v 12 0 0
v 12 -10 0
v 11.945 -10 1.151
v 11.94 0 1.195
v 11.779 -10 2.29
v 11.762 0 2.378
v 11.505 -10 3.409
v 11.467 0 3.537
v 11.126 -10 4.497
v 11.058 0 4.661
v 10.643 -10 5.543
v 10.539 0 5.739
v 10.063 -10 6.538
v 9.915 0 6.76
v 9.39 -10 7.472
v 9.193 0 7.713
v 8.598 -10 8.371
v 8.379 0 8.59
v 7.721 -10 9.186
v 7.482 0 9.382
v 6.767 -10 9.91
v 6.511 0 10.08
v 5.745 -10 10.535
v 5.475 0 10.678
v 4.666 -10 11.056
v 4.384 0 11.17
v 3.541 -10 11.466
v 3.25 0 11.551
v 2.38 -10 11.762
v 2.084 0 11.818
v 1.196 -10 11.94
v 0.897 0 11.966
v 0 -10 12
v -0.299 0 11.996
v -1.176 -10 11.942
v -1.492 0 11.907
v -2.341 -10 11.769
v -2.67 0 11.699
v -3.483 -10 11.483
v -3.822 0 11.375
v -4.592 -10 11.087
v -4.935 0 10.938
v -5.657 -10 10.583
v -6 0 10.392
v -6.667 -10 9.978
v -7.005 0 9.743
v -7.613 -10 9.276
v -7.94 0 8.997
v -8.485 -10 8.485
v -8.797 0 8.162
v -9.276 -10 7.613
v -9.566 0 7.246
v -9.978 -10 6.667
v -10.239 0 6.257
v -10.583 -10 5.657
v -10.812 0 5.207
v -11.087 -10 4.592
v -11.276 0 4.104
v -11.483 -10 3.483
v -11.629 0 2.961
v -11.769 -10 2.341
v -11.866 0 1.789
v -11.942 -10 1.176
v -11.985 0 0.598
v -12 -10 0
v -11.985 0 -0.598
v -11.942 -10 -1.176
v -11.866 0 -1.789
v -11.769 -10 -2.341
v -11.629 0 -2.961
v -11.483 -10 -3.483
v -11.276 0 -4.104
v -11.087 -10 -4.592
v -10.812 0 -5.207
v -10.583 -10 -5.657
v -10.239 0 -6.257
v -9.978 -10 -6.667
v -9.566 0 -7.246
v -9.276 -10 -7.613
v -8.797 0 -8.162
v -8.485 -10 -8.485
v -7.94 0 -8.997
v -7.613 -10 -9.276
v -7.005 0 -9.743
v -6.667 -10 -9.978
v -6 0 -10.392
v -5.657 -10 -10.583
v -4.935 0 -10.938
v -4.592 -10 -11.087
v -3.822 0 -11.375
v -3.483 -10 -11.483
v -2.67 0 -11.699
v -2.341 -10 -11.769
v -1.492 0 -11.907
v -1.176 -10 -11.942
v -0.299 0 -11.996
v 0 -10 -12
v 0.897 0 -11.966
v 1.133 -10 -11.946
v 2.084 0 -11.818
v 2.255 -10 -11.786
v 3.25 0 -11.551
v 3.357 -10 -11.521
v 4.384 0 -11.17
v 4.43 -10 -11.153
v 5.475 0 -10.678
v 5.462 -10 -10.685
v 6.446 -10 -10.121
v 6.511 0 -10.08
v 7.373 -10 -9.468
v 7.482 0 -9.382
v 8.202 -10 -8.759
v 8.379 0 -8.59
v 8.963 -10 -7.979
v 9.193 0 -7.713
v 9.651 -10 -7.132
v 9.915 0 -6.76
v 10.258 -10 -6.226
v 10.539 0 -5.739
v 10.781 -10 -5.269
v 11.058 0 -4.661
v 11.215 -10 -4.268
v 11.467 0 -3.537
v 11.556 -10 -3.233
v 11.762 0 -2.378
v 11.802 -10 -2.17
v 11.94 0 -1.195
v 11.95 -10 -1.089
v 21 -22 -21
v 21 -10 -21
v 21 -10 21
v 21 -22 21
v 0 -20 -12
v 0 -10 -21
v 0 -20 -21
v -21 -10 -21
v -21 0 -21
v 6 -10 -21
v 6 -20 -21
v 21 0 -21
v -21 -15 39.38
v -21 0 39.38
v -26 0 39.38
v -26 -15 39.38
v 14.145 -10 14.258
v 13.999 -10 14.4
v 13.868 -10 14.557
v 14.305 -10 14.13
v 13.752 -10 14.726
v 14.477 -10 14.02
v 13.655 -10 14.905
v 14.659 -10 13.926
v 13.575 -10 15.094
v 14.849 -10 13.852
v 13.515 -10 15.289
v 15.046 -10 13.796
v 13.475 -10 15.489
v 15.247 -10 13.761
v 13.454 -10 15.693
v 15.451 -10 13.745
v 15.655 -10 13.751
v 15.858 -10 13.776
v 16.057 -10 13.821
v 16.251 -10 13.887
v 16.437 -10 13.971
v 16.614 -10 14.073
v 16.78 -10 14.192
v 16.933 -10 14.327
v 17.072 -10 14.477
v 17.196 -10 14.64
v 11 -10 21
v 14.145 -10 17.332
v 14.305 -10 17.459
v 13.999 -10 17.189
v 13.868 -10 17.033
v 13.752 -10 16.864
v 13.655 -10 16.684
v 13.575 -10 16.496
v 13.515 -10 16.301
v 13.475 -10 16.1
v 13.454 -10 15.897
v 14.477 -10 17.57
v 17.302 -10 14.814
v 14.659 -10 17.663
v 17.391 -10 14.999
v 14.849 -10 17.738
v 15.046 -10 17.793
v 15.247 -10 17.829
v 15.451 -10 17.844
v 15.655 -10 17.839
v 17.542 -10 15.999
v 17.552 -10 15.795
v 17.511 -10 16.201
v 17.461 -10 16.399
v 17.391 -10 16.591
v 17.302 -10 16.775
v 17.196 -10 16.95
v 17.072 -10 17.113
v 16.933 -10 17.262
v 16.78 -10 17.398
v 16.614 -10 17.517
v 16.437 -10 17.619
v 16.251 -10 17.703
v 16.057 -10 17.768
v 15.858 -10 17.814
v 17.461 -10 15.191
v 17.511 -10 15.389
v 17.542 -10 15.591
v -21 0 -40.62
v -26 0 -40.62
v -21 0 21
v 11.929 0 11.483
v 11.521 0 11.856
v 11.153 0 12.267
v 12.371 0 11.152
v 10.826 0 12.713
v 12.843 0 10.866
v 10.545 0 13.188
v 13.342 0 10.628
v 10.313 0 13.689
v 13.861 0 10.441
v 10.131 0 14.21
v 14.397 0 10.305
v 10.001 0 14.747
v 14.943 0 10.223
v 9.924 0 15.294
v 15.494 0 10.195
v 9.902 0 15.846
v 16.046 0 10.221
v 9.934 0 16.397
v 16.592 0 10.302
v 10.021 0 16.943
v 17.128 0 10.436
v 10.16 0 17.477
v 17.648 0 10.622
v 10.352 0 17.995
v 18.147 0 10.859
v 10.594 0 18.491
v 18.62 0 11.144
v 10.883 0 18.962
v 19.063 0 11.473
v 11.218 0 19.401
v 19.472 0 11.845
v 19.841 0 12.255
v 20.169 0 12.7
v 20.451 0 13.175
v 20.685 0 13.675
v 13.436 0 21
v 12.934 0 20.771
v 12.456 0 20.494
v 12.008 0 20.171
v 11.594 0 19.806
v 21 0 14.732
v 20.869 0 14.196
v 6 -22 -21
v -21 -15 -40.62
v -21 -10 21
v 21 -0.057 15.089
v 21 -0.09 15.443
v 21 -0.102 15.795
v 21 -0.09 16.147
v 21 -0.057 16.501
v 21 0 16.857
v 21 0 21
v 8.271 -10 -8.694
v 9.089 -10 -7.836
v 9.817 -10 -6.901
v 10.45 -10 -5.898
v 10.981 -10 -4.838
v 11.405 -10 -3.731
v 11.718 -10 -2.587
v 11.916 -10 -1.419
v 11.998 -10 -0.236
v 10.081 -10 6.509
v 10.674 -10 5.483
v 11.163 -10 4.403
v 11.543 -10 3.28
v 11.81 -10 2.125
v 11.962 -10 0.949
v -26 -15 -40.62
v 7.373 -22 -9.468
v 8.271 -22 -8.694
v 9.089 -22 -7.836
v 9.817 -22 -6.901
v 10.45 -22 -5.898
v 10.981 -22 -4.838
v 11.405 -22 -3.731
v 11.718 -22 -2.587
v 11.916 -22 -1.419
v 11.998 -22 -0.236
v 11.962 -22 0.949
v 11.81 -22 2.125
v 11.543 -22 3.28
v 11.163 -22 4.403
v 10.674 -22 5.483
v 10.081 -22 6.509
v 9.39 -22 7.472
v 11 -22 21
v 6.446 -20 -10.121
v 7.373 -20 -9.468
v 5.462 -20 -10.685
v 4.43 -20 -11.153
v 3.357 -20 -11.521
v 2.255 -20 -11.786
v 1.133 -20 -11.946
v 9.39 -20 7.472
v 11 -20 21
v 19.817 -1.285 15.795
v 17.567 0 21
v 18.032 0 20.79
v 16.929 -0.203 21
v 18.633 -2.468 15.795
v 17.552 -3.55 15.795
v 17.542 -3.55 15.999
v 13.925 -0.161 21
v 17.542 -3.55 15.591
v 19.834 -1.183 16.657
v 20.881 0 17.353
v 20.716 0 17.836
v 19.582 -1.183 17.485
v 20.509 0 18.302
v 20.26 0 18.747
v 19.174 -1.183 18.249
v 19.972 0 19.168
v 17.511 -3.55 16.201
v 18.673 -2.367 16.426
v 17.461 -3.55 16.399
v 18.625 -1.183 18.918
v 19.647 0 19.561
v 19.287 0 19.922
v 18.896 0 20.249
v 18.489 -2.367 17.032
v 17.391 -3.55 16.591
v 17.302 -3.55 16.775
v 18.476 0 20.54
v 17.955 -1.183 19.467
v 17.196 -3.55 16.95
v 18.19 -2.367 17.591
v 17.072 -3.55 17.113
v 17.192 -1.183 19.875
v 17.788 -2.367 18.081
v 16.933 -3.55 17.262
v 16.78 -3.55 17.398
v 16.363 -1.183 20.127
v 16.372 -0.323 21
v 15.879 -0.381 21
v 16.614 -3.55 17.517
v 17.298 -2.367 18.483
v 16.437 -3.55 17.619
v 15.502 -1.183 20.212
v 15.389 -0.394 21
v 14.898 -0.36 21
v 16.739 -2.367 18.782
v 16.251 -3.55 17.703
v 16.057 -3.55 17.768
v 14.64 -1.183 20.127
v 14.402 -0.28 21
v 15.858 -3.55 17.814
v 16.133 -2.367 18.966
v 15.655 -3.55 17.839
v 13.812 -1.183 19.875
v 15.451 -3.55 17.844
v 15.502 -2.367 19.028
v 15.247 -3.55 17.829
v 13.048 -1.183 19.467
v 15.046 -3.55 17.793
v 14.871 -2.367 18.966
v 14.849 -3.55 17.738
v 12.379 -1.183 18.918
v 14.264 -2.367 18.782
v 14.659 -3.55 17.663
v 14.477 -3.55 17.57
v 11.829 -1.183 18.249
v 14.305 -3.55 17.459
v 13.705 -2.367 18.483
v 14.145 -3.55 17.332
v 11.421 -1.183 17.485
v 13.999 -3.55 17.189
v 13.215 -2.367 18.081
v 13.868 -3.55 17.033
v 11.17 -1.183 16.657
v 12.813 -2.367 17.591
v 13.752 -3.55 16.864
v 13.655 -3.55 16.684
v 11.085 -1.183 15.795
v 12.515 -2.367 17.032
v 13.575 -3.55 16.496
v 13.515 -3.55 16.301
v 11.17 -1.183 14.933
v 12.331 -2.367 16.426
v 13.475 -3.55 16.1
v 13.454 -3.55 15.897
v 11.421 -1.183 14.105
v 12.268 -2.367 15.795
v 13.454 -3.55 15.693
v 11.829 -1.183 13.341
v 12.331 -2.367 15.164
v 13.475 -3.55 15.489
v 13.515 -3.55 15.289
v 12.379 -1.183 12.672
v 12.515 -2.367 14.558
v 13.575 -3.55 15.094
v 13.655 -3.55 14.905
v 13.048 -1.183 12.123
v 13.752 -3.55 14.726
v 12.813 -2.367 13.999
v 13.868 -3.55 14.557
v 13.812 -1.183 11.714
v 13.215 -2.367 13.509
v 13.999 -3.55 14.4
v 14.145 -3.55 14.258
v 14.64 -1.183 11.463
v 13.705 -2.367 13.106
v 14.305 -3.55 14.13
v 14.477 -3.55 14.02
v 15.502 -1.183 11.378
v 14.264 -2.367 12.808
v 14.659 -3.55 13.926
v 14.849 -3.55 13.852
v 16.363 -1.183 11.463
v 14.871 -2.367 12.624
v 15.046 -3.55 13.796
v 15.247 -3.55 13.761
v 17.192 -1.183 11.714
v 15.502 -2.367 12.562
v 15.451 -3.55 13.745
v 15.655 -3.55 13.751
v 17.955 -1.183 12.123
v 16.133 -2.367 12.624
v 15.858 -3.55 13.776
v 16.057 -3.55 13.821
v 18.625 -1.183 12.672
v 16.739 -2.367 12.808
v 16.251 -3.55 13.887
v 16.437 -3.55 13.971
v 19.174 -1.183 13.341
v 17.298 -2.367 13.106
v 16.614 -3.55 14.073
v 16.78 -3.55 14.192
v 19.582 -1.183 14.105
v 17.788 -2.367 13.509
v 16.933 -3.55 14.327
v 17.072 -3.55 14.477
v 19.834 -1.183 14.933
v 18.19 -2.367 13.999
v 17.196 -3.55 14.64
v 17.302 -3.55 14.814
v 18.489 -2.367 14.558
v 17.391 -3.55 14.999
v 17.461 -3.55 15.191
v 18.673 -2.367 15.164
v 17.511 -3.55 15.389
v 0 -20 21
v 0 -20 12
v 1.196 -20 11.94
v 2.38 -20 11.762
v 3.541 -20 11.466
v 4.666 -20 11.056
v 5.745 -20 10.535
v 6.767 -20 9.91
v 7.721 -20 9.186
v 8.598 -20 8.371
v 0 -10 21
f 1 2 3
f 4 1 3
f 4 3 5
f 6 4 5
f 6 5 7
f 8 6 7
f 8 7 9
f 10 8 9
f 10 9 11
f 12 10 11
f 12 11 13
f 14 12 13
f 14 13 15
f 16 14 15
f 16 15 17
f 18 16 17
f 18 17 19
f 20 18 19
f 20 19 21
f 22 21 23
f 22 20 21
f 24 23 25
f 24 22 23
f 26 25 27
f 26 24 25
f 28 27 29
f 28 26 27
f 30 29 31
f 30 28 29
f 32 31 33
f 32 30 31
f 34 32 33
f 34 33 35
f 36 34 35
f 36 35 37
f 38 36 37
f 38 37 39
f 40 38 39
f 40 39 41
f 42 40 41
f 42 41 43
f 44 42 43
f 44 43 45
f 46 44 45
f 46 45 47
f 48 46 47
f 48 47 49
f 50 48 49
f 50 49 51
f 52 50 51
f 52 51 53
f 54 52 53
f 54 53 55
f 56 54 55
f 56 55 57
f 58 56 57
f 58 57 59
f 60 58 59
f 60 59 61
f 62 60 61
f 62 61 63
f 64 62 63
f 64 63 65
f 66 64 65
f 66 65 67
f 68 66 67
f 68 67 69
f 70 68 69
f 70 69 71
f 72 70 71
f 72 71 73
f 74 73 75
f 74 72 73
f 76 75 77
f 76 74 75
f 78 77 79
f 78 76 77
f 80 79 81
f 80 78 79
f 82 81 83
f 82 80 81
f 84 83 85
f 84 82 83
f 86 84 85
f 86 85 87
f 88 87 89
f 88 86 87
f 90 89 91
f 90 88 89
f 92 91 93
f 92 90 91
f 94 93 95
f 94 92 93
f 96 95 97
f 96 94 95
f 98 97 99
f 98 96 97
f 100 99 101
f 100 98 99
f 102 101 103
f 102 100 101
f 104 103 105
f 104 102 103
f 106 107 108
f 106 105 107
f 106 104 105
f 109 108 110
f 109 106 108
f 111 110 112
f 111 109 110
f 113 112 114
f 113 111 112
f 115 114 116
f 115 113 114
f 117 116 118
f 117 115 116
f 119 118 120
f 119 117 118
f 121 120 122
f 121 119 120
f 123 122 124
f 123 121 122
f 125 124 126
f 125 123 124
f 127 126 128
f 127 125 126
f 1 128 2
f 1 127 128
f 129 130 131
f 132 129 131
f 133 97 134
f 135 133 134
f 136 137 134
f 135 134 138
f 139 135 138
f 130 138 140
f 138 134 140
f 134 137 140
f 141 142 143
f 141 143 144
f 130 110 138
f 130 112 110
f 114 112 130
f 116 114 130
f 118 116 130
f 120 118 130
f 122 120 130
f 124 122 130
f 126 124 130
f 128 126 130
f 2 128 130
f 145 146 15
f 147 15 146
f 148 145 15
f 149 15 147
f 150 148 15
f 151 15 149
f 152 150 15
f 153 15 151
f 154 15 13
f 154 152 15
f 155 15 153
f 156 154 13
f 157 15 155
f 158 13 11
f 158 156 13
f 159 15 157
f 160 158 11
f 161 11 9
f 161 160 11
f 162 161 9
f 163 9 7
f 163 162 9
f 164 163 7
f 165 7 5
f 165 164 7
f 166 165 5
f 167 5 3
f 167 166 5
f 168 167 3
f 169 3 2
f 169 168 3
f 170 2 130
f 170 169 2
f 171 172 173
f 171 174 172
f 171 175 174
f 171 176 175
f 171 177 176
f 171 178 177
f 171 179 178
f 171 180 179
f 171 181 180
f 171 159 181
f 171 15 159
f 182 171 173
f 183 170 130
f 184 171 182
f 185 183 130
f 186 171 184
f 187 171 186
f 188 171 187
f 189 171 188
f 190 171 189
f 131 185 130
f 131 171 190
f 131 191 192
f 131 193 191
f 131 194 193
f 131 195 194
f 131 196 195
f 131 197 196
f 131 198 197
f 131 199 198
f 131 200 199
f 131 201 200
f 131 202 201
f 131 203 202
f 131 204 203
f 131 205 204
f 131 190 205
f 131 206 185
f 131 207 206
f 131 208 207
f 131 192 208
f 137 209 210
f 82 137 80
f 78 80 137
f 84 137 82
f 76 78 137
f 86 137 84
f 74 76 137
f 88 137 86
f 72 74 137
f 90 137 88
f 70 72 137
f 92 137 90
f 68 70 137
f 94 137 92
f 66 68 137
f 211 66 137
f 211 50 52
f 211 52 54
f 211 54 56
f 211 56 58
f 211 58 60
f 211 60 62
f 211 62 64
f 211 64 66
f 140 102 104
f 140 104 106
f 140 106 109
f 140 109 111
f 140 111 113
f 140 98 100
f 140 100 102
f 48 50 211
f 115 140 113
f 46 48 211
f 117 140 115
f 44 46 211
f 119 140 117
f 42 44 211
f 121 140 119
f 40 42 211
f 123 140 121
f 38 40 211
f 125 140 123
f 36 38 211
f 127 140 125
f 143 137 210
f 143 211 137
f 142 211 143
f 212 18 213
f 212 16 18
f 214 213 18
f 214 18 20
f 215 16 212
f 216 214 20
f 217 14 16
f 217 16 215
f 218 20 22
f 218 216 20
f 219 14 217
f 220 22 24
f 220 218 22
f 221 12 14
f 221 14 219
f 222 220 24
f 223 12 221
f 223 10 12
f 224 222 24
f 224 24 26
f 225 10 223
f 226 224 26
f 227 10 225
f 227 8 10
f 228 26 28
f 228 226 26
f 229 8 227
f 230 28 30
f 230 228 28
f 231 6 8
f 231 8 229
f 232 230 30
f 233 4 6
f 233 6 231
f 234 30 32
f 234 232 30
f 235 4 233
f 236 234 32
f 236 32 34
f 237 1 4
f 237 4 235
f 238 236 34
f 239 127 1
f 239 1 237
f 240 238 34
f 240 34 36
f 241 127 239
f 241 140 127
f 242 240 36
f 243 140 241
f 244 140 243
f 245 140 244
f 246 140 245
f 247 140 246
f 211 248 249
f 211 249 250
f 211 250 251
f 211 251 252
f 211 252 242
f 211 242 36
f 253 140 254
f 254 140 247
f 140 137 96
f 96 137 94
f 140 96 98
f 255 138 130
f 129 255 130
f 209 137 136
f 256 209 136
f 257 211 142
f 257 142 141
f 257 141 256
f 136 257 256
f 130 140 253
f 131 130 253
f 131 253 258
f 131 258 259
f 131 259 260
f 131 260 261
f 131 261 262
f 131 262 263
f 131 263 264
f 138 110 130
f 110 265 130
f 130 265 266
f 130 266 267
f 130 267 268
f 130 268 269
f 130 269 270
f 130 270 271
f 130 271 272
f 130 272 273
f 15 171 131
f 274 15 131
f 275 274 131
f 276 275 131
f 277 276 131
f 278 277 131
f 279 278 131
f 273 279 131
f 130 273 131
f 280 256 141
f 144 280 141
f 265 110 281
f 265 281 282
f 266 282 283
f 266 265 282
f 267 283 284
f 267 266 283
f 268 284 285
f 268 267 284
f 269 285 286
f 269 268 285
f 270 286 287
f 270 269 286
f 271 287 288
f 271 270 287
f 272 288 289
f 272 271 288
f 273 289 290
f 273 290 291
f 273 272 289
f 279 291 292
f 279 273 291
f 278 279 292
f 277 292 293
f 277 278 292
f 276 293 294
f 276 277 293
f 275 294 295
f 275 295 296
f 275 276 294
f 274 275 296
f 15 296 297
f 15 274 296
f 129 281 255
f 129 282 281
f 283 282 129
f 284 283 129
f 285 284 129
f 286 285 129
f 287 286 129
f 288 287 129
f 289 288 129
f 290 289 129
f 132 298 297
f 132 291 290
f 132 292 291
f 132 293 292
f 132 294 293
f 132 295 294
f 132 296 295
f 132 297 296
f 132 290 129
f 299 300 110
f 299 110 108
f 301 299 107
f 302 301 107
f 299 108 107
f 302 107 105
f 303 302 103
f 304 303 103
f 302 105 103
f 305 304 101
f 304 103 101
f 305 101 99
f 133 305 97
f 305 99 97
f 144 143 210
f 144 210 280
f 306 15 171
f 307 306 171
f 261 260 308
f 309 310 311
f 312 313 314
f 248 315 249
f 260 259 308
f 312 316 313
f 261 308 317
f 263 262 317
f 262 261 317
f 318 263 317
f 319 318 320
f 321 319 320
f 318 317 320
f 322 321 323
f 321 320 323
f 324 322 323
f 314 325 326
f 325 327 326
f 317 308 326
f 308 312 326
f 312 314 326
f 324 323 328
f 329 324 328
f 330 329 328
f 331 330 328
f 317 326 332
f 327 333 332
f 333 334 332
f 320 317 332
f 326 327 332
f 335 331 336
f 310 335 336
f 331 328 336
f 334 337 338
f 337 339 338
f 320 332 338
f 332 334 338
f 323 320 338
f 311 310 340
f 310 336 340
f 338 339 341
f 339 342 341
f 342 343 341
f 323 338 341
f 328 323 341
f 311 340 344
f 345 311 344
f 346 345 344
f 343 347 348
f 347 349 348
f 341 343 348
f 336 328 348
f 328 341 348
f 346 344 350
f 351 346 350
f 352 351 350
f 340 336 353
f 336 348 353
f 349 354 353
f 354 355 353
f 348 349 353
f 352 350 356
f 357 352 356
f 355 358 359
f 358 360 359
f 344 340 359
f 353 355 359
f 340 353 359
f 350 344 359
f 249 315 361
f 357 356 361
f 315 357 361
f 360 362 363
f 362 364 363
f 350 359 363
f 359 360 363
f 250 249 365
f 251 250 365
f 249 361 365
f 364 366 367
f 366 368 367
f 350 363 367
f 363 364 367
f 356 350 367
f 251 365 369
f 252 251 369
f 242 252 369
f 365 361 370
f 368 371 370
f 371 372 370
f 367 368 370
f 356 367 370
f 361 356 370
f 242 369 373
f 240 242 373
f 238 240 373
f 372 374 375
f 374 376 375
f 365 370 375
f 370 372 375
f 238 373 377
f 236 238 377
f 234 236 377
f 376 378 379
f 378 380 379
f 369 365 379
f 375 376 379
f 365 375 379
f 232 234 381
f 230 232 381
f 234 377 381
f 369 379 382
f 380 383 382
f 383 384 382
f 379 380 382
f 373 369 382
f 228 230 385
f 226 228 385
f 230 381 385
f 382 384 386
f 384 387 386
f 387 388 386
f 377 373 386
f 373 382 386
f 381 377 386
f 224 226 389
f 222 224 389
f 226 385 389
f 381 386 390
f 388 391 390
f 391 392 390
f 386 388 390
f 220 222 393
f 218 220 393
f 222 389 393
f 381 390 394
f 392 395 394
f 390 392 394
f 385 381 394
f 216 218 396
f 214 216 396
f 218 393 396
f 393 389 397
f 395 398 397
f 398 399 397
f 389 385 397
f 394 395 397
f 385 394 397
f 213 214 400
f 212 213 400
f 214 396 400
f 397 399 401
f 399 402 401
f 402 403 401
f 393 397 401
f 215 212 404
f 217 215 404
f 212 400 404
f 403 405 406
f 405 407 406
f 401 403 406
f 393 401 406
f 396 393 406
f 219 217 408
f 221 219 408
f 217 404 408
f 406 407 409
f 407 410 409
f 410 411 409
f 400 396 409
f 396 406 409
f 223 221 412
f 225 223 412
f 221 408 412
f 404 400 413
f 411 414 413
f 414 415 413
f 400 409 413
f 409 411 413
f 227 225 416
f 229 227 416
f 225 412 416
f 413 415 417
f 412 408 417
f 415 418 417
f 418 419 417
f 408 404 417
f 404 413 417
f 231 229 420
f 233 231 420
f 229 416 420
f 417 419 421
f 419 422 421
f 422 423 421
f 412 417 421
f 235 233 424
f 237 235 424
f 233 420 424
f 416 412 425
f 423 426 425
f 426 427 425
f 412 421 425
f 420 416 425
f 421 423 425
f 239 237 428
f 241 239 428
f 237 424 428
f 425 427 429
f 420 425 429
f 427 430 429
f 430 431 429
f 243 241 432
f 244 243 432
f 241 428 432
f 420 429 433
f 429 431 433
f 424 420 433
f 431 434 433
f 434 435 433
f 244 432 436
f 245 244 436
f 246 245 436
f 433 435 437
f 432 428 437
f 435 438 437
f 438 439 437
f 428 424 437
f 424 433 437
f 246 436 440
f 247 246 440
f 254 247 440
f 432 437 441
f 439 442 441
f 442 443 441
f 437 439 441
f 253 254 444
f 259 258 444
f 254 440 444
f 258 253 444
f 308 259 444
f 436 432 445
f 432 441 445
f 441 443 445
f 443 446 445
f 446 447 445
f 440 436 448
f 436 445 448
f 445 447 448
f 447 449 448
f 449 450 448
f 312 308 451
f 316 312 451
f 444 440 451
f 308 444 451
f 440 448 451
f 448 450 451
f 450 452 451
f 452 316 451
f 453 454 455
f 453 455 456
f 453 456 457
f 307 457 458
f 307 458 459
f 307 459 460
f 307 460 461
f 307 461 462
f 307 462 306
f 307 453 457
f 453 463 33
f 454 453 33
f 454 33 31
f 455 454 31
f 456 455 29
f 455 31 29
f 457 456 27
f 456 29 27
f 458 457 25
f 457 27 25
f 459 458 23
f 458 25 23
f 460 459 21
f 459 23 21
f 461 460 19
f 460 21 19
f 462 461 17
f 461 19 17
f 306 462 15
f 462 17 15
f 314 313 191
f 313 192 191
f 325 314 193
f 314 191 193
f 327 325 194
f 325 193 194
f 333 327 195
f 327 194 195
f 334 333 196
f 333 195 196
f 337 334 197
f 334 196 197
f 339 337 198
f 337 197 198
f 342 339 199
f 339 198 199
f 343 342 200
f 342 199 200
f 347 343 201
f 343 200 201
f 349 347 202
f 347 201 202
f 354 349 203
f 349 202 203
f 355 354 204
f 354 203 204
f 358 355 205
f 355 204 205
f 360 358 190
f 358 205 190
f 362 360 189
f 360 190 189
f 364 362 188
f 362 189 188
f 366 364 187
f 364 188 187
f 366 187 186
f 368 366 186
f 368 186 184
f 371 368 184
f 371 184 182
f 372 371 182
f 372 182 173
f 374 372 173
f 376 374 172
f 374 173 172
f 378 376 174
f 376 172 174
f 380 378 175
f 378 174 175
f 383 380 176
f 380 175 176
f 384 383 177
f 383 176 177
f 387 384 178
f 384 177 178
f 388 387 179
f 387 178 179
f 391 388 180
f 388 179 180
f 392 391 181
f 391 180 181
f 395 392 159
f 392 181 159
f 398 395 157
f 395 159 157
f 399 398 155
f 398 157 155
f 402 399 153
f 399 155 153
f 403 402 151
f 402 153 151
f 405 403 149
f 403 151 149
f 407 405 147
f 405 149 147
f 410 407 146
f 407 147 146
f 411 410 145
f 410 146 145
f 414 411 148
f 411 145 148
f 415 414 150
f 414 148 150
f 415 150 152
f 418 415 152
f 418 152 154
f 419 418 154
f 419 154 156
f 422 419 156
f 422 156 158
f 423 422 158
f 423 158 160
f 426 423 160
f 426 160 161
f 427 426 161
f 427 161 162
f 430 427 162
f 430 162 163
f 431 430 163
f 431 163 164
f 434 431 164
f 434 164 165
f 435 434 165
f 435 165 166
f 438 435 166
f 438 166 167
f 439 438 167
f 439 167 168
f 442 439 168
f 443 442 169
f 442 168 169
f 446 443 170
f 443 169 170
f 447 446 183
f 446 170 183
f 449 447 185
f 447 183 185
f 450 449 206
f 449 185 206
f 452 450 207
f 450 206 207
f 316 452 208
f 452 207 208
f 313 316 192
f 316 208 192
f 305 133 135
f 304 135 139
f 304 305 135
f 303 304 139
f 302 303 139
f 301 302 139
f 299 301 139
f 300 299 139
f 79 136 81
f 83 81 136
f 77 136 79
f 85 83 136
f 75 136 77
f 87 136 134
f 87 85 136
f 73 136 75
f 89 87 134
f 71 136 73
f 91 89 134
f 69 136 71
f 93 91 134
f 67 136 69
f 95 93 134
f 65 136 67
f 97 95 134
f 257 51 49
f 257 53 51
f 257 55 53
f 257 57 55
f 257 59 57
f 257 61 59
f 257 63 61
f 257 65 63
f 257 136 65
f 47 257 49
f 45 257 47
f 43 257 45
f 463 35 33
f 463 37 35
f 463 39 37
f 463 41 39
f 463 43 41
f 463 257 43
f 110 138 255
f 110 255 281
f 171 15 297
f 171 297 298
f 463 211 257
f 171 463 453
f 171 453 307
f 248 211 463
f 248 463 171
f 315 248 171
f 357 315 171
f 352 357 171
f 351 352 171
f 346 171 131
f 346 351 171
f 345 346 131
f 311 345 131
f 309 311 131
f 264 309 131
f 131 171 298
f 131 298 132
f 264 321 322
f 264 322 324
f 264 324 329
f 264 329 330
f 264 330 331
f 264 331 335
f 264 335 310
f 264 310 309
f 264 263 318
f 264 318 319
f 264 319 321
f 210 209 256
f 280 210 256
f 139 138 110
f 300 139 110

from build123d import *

# Parameters (mm, degrees)
F0_W           = 42
F0_H           = 42
F0_R           = 12
F1_DEPTH       = 10
F2_W           = 15
F2_H           = 80
F3_DEPTH       = 5
F5_DEPTH       = 10
F6_DEPTH       = 12
F8_D           = 4.1
F8_CSINK_D     = 11.2
F8_CSINK_ANGLE = 90


with BuildPart() as f1:
    # F0 (on Front) → F1 (new body)
    with BuildSketch(Plane.XZ):
        Rectangle(F0_W, F0_H)
        Circle(F0_R, mode=Mode.SUBTRACT)
    extrude(amount=F1_DEPTH)

    # F2 (on face) → F3 (join)
    with BuildSketch(Plane(origin=(-21, 0, 0), x_dir=(0, -1, 0), z_dir=(-1, 0, 0))):
        with Locations((7.5, -0.6199396634)):
            Rectangle(F2_W, F2_H)
    extrude(amount=F3_DEPTH)

    # F4 (on face) → F5 (join)
    with BuildSketch(Plane.XZ.offset(10)):
        with BuildLine():
            Line((9.3895657925, 7.4723526569), (11, 21))
            Line((11, 21), (0, 21))
            Line((0, 21), (0, 12))
            ThreePointArc((0, 12), (5.2120901814, 10.8089831132), (9.3895657925, 7.4723526569))
        make_face()
        with BuildLine():
            Line((6, -21), (7.3728713232, -9.4678808849))
            ThreePointArc((7.3728713232, -9.4678808849), (3.8977833047, -11.3493297295), (0, -12))
            Line((0, -12), (0, -21))
            Line((0, -21), (6, -21))
        make_face()
    extrude(amount=F5_DEPTH)


with BuildPart() as f6:
    # F6 (new): a face of the model
    f6_faces = [f1.part.faces().sort_by_distance(p)[0] for p in [
        (15.0870554418, -10, -1.4200647771),
    ]]
    extrude(f6_faces, amount=F6_DEPTH)


with BuildPart() as f1_1:
    add(f1.part)

    # F8 (through all)
    with Locations(Plane(origin=(0, 0, 0), x_dir=(-1, 0, 0), z_dir=(0, 1, 0))):
        with Locations((-15.5017171055, 15.7948527485)):
            CounterSinkHole(F8_D / 2, F8_CSINK_D / 2, counter_sink_angle=F8_CSINK_ANGLE)


solid = Compound([f6.part, f1_1.part])
